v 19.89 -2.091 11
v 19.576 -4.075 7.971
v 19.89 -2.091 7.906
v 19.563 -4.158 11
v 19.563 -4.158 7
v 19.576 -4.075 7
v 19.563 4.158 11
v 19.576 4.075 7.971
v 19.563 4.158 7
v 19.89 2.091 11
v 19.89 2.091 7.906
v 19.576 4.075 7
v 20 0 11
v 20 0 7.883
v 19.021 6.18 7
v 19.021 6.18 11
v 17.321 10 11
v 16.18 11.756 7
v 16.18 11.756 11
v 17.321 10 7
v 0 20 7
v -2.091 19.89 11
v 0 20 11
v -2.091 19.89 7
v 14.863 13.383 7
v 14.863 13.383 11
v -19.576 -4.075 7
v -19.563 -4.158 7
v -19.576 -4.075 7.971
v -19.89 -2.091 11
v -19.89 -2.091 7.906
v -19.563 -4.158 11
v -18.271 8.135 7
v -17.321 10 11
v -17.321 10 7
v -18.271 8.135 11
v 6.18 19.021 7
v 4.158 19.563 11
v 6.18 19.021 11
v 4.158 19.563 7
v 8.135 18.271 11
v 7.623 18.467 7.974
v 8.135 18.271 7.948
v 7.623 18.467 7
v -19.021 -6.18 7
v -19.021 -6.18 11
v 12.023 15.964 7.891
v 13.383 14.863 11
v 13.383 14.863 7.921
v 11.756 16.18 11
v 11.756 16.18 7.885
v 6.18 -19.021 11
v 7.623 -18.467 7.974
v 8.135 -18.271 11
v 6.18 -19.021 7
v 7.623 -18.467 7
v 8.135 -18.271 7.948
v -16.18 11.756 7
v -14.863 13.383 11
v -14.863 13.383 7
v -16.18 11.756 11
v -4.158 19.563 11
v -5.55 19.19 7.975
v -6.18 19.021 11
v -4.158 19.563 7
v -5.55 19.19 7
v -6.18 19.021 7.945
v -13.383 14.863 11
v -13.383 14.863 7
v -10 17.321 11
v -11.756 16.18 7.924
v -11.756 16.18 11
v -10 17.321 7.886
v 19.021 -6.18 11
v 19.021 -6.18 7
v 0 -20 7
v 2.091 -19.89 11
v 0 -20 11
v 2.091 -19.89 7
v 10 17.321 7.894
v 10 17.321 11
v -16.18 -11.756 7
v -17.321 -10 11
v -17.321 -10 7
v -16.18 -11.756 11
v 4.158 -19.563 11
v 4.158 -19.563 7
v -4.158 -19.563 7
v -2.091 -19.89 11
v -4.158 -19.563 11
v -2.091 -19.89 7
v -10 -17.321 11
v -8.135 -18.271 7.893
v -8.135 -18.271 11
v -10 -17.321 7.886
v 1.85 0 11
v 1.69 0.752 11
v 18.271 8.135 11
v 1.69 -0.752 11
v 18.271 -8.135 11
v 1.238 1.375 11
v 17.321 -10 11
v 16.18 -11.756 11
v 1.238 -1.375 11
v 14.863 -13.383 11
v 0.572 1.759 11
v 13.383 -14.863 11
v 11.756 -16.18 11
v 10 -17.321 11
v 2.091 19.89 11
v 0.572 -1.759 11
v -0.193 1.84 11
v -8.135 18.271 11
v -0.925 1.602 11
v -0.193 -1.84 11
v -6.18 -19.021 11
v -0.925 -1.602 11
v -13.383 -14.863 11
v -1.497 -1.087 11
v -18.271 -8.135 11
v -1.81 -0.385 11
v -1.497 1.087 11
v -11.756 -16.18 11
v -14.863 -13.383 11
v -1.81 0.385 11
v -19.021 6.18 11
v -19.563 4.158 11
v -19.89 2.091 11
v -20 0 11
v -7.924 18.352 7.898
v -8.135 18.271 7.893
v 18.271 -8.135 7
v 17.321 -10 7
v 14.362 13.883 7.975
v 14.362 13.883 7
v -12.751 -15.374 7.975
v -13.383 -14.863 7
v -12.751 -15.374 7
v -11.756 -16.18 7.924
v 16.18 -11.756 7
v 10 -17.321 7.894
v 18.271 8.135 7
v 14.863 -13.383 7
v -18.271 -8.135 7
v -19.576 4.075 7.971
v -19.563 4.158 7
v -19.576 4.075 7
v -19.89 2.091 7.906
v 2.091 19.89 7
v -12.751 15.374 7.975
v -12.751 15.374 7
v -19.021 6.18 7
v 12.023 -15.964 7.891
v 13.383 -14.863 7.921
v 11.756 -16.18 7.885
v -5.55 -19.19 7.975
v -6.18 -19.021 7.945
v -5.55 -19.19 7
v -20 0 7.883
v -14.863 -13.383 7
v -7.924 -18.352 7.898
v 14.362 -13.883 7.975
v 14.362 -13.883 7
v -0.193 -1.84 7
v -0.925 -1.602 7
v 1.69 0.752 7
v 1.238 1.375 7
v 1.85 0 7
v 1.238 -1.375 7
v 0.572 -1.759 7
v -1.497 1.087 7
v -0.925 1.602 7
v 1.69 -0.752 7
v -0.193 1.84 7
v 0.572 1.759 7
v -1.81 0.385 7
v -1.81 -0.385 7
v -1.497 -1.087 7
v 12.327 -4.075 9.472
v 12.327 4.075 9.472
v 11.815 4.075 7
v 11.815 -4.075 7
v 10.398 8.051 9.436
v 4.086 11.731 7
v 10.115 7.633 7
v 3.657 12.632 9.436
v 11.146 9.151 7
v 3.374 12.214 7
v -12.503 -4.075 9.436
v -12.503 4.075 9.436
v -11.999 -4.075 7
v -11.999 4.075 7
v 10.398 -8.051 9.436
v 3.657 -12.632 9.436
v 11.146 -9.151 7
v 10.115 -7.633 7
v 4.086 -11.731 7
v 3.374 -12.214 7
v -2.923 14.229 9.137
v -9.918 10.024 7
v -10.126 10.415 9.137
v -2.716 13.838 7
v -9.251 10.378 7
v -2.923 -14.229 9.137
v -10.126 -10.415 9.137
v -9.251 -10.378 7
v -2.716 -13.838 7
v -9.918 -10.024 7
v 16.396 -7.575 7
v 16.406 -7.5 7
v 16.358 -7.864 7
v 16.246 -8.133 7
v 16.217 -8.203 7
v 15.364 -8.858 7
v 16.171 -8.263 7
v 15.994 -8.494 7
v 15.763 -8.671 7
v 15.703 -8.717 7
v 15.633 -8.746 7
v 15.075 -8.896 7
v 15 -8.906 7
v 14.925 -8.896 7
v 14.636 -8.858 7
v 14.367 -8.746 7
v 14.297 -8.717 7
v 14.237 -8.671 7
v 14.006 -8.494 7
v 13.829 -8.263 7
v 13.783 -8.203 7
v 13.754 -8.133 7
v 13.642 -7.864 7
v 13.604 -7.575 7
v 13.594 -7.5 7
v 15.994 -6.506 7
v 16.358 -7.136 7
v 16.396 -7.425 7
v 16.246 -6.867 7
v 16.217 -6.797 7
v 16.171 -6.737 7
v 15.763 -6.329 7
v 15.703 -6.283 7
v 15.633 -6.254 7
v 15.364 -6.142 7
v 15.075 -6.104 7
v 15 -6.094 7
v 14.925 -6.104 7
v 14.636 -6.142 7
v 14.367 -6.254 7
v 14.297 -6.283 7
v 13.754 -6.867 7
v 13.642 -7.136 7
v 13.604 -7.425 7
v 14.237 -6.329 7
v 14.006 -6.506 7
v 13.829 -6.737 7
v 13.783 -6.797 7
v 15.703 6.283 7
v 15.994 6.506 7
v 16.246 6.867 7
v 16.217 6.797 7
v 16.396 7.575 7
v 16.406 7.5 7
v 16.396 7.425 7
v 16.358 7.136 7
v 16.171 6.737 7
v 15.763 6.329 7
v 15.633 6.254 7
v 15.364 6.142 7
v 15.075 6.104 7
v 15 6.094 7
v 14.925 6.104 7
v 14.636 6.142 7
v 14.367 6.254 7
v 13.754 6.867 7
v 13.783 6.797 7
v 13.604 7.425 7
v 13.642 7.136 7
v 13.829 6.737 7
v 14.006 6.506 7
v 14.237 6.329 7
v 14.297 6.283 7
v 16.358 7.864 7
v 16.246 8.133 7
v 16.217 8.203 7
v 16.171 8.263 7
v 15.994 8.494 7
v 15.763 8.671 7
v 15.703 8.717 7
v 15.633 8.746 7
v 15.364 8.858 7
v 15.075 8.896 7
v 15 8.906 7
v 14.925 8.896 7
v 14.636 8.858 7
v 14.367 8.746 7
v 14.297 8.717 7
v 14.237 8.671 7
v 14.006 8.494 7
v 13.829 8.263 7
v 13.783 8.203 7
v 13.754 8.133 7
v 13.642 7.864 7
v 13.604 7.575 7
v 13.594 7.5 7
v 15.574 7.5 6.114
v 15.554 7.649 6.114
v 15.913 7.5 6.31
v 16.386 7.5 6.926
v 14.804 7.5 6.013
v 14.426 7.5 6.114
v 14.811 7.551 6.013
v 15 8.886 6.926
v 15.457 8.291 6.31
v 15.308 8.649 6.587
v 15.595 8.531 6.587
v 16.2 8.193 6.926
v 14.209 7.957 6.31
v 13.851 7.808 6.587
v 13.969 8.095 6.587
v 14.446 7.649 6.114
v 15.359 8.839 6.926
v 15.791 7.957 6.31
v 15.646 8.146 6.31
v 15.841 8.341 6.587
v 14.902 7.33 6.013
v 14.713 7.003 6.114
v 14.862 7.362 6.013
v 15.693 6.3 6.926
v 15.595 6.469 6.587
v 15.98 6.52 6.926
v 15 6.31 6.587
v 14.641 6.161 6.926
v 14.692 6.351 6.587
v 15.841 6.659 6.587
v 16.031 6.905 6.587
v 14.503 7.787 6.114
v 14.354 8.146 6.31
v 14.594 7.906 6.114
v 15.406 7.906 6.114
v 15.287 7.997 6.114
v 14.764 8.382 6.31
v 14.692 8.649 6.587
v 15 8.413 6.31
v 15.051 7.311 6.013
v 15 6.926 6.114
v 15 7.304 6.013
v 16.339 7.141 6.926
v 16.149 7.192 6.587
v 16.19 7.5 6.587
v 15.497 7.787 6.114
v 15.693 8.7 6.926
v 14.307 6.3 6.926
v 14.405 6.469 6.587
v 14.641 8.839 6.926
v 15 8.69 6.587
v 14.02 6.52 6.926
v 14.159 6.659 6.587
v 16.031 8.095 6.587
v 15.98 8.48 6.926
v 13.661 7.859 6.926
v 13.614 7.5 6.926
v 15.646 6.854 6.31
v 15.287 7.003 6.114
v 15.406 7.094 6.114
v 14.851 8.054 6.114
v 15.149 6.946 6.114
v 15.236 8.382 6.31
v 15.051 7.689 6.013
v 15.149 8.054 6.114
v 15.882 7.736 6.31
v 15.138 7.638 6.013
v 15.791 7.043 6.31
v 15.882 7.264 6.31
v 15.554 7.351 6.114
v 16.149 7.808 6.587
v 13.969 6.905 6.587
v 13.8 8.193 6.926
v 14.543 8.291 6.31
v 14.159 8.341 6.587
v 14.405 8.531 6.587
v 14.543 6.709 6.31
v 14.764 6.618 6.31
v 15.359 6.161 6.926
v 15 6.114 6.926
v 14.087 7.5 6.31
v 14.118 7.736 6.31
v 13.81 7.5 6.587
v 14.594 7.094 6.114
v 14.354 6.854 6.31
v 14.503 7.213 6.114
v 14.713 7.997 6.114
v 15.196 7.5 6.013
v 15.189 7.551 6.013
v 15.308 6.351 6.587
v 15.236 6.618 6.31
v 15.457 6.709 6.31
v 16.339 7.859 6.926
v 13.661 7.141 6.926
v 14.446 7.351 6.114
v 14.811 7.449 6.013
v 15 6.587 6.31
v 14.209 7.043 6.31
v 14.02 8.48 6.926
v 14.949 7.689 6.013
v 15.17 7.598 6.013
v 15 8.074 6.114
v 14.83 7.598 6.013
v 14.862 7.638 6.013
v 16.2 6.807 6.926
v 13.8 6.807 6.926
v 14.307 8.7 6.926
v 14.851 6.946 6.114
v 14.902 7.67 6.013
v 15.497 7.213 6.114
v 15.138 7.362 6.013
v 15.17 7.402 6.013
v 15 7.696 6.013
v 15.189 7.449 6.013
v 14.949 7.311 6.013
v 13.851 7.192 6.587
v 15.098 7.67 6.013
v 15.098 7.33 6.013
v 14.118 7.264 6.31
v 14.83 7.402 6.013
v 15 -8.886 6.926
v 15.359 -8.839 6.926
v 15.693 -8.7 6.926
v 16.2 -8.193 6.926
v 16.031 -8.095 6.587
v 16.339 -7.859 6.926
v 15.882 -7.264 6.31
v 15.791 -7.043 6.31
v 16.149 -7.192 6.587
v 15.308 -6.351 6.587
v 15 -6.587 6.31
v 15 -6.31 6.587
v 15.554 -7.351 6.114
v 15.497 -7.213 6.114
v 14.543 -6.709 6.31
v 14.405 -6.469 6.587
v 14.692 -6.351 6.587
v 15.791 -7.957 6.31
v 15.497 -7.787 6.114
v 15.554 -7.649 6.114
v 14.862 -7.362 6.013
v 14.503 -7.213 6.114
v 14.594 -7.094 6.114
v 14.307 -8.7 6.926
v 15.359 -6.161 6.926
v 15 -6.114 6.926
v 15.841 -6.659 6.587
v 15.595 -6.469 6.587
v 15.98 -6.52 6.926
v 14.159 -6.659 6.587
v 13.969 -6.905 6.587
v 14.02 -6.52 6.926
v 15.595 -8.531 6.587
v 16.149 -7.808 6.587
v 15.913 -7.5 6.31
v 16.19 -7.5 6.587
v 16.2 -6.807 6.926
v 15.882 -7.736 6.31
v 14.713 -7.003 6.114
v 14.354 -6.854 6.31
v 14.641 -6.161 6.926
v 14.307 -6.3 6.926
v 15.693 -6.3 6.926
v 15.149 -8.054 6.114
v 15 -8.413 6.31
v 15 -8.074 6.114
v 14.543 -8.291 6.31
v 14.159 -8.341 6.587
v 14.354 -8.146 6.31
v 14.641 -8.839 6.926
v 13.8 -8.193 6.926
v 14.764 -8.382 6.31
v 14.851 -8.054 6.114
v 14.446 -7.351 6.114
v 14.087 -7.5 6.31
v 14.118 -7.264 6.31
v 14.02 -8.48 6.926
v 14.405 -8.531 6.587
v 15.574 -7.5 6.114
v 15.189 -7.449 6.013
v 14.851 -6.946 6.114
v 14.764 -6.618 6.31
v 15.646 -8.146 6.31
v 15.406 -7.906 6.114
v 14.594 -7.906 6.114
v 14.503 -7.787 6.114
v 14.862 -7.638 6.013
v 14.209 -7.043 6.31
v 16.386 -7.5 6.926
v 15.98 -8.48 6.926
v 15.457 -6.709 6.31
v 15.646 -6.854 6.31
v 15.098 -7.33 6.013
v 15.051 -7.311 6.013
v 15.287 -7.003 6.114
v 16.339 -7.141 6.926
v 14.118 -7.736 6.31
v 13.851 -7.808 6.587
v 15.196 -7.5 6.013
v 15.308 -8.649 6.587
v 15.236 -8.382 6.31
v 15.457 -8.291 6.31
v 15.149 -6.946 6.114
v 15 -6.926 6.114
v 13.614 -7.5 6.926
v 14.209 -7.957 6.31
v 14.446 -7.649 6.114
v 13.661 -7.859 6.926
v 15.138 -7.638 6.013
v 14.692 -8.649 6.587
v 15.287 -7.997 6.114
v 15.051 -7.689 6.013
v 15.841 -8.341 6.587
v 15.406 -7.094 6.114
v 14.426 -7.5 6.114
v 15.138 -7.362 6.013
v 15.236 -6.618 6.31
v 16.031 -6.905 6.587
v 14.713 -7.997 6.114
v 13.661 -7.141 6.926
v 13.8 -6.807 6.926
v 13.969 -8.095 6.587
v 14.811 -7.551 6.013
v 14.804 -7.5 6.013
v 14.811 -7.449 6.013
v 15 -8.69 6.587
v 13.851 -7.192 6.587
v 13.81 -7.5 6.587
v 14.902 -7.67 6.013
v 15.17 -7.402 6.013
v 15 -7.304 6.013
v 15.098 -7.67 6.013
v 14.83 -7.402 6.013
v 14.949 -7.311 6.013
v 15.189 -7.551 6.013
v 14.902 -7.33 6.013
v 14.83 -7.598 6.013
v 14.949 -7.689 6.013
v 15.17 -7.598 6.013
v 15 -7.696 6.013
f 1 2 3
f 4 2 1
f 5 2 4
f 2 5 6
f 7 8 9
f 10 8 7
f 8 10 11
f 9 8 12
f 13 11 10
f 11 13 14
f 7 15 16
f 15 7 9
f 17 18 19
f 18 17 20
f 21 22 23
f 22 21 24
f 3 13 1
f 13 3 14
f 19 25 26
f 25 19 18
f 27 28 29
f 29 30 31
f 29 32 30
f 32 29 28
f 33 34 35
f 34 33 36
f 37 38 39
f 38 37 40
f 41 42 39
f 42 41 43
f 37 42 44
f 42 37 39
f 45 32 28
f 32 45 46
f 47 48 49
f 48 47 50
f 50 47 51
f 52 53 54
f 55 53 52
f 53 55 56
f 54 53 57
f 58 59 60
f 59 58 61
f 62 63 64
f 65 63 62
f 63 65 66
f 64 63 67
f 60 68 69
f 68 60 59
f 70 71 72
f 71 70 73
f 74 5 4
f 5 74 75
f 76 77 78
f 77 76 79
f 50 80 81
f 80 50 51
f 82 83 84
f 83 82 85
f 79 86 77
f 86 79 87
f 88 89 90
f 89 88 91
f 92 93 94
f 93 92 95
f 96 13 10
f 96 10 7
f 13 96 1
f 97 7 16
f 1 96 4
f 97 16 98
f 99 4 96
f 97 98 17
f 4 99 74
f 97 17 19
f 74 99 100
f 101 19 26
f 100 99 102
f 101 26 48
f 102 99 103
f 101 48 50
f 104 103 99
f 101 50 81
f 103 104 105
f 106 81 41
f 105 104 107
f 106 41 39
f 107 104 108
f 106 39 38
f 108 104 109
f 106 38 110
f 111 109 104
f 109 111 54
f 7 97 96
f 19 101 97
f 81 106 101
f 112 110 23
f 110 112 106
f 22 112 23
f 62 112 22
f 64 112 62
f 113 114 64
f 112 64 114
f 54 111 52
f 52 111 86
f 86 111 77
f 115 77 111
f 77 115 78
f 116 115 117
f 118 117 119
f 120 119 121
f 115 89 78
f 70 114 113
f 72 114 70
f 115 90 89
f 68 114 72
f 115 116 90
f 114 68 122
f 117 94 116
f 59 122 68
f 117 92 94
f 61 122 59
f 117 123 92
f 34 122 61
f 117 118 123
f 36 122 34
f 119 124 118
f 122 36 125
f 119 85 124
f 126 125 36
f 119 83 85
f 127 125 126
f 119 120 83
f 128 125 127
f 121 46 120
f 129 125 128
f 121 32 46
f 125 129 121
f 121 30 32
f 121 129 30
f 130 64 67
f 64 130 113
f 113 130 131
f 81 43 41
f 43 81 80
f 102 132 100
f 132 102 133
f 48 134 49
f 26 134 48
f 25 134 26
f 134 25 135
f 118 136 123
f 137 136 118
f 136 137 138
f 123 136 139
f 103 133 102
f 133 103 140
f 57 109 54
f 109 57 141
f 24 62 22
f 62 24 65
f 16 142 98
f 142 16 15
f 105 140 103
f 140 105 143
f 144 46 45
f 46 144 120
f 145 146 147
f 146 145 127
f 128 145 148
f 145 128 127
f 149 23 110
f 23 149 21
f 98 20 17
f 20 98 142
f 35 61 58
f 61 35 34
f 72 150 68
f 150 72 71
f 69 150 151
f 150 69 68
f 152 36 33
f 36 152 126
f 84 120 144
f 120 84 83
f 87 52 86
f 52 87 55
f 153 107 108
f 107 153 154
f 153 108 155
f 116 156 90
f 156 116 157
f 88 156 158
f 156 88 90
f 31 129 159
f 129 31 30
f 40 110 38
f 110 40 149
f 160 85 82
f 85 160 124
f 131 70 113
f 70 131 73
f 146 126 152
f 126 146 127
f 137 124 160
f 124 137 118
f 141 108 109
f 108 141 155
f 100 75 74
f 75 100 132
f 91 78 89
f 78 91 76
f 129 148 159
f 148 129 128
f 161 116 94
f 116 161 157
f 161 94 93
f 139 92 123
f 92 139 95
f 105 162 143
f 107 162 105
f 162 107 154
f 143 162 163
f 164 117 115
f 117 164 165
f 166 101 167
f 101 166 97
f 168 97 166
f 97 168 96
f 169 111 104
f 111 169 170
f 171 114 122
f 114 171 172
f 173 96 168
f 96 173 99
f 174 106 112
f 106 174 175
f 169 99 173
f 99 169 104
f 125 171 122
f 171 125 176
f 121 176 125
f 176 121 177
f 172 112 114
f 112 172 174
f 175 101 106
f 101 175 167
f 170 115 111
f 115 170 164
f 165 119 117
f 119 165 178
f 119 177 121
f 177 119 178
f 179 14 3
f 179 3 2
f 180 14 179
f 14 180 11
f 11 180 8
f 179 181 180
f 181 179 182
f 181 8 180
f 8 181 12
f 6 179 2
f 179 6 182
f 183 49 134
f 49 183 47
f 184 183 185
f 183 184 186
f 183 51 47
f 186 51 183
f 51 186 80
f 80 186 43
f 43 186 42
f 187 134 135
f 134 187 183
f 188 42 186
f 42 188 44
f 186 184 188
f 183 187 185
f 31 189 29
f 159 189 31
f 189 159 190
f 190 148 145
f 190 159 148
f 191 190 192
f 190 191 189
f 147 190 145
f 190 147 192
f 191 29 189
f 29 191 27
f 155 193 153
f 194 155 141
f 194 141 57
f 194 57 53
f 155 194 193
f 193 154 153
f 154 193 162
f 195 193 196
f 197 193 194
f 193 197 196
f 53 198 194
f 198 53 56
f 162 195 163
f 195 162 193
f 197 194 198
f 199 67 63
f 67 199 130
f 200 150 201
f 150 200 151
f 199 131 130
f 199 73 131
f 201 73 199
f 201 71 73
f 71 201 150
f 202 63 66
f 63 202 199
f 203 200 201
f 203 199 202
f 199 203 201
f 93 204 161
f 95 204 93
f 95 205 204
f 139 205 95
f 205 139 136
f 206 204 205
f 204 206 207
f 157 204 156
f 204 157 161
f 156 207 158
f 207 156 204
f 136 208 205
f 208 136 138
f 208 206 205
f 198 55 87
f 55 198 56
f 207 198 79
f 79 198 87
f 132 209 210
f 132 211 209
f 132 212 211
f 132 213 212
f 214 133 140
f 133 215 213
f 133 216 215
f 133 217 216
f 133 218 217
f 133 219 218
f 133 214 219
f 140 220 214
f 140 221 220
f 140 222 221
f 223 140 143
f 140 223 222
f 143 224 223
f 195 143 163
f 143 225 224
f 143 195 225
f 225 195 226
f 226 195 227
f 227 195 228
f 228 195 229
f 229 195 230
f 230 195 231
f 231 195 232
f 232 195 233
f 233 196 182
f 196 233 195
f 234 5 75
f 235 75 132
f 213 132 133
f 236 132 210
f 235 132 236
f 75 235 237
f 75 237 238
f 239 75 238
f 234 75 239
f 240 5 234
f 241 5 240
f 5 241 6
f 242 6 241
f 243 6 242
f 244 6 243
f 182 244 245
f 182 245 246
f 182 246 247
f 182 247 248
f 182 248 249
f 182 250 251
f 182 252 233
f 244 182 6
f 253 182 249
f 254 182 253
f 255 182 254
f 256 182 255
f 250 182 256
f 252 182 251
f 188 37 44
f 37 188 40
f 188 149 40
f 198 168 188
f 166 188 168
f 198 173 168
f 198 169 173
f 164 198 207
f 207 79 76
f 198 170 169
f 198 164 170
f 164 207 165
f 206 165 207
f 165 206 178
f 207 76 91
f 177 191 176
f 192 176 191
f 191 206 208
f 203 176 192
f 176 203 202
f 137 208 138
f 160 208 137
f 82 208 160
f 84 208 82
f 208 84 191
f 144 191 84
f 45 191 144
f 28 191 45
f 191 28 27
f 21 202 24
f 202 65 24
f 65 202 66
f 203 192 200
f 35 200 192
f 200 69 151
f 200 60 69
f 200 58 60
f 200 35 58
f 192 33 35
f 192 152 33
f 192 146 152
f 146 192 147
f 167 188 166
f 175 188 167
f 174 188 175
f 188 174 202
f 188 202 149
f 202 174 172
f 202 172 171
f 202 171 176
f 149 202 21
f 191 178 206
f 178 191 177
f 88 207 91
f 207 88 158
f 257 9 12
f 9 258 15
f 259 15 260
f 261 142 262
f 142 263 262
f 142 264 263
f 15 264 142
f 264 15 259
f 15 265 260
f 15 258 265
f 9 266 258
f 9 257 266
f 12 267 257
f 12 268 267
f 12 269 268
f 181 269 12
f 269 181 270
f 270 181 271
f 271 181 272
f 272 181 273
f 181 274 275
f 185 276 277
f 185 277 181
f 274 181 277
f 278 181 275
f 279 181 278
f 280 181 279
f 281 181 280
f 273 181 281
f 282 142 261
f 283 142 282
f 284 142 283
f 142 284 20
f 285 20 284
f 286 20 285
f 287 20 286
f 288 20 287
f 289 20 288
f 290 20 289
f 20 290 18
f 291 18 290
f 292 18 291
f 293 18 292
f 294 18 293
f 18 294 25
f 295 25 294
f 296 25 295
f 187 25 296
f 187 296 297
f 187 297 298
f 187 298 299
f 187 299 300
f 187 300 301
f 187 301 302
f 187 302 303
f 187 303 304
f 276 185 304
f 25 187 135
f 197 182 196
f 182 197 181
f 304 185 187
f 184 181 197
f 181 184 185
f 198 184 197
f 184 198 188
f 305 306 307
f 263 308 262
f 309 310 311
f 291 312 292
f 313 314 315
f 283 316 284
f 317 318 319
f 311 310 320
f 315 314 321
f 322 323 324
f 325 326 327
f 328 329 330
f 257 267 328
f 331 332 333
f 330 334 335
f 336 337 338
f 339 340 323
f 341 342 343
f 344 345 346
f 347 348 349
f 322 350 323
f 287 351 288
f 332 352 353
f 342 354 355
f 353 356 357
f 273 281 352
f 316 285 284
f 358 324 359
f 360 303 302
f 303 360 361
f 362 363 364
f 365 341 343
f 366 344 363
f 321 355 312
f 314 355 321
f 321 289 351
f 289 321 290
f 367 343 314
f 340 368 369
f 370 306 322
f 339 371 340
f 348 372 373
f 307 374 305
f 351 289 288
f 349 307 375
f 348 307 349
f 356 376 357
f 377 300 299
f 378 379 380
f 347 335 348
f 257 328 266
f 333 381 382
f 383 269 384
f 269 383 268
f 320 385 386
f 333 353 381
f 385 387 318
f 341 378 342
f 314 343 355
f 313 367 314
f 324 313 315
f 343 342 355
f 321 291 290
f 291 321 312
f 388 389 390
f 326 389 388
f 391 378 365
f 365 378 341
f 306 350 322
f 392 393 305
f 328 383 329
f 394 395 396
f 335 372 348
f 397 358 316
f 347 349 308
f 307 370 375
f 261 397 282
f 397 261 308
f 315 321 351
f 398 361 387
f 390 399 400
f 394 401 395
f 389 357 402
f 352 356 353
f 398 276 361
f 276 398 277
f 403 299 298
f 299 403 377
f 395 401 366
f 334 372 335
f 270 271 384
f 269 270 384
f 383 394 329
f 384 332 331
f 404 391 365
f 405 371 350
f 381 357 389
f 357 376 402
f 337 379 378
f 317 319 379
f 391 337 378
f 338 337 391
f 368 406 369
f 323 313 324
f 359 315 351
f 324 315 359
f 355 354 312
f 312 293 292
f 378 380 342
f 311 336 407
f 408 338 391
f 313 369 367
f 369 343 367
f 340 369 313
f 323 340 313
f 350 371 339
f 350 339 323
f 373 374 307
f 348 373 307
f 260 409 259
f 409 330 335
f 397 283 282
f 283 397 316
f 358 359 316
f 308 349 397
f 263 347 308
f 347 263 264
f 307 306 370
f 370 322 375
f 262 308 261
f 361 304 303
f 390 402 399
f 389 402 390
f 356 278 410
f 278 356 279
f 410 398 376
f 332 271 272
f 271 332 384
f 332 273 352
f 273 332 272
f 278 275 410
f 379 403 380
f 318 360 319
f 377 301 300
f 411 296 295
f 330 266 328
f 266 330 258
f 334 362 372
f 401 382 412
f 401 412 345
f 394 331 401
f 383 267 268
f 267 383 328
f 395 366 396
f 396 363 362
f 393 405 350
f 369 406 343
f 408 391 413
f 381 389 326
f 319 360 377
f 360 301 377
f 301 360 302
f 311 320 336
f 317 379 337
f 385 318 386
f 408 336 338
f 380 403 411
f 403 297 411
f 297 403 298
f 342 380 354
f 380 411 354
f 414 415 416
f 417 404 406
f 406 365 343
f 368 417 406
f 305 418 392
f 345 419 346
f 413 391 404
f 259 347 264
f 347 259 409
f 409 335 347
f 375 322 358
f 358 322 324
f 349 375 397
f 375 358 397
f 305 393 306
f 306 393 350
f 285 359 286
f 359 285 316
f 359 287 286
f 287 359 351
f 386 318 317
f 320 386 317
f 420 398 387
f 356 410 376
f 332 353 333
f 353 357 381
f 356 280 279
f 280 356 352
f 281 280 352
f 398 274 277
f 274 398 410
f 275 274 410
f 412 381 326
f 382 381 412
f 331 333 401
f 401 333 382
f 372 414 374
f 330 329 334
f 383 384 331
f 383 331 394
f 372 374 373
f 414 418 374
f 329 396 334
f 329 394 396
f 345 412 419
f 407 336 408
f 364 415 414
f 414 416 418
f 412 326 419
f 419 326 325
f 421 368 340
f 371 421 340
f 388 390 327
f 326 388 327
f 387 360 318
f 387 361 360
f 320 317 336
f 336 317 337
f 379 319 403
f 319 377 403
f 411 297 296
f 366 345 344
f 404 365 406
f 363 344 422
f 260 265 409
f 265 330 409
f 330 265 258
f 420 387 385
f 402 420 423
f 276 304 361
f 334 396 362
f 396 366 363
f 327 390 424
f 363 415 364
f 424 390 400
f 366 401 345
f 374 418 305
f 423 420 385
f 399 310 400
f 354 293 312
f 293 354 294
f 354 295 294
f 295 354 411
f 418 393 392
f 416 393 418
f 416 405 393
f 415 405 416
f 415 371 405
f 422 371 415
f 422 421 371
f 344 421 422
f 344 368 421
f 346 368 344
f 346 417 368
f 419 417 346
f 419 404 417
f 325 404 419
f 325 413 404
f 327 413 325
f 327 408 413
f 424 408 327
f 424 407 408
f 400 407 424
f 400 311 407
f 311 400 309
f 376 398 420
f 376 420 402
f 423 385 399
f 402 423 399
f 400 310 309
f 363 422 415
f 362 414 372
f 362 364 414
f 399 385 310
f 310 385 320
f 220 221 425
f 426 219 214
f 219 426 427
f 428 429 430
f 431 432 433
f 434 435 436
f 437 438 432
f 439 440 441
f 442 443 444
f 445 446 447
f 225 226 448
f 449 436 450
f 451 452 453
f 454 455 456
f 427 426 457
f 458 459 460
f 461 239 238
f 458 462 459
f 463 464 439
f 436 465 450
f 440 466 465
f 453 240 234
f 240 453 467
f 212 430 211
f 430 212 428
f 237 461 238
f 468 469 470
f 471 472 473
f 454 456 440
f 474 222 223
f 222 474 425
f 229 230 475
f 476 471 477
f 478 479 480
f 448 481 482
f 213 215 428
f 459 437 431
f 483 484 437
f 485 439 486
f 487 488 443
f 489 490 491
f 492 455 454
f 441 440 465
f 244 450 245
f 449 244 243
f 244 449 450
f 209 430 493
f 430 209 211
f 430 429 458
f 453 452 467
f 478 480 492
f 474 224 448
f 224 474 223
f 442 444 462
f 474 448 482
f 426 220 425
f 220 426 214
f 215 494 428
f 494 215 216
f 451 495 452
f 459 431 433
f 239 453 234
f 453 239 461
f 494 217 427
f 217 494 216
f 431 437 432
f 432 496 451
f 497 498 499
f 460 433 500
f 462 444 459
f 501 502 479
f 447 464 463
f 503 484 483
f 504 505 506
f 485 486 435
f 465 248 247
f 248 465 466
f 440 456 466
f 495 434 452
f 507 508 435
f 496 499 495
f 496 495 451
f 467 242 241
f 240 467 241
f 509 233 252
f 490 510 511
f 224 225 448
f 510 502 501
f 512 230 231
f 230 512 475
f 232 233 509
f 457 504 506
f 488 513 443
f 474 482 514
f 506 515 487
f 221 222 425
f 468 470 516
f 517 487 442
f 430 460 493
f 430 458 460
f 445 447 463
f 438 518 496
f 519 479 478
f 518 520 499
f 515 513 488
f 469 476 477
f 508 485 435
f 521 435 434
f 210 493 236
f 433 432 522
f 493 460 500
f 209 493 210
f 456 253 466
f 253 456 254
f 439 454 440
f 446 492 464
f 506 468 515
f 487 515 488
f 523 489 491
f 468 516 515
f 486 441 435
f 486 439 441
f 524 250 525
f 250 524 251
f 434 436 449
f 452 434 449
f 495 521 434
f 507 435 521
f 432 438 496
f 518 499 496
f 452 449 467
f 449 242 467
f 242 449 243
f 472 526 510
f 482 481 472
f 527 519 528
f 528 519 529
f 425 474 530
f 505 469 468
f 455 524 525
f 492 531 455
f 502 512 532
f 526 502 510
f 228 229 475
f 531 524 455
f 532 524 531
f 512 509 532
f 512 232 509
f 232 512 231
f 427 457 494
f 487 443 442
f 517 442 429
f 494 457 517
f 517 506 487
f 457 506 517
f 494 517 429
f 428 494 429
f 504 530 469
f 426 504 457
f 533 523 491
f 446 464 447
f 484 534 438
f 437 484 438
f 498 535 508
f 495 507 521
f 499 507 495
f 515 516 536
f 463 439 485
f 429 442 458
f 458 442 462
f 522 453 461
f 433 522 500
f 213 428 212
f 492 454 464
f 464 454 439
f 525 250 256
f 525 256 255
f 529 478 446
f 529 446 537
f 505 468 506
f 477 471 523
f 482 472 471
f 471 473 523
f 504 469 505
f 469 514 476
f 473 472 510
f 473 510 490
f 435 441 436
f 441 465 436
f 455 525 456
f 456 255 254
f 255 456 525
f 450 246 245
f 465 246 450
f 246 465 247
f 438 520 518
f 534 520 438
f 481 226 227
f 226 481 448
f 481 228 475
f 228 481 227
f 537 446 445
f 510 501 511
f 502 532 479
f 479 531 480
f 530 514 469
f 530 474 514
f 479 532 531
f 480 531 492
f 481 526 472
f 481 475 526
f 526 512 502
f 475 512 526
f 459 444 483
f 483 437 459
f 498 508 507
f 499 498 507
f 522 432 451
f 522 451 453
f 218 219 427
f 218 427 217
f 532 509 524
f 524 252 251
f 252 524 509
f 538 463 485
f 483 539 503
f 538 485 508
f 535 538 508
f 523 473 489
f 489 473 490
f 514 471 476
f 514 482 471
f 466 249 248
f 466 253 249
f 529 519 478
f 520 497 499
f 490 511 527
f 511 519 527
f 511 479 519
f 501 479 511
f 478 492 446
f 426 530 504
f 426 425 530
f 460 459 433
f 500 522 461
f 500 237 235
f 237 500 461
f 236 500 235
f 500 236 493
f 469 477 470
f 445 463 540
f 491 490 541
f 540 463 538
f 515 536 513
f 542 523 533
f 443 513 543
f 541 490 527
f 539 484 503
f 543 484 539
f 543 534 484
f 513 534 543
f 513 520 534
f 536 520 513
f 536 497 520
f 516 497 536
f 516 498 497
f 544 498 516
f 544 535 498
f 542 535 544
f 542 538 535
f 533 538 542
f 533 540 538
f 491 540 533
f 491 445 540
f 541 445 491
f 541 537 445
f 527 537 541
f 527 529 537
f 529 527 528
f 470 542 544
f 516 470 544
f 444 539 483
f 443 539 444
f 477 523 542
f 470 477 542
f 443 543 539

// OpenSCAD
offset=-3;

//difference(){
//translate([0,0,offset])
//cylinder(d=40,h=30,$fn=60,center=true);
//cylinder(d=3.7,h=60,$fn=15,center=true);
//rotate([0,0,0])//A
//rotate([0,11.7,0])translate([20.1,0,0])
//cube([20,8.15,23.55],center=true);
//rotate([0,0,55.8])//B
//rotate([0,11.7,0])translate([20.28,0,0])
//cube([20,8.15,23.55],center=true);
//rotate([0,0,180])//B
//rotate([0,11.7,0])translate([20.33,0,0])
//cube([20,8.15,23.55],center=true);
//rotate([0,0,-55.8])//B
//rotate([0,11.7,0])translate([20.33,0,0])
//cube([20,8.15,23.55],center=true);
//rotate([0,0,55.8+62.1])//C
//rotate([0,11.7,0])translate([21.80,0,0])
//cube([20,8.15,23.55],center=true);
//rotate([0,0,-55.8-62.1])//C
//rotate([0,11.7,0])translate([21.80,0,0])
//cube([20,8.15,23.55],center=true);
//translate([0,0,-12])cylinder(d=50,h=30);
//}
//difference(){
//translate([0,0,-18])cylinder(d=10,h=12,$fn=30);
//cylinder(d=3,h=100,$fn=12,center=true);
//}
//translate([15,7.5,-12.3])sphere(r=1.5,$fn=24);
//translate([15,-7.5,-12.3])sphere(r=1.5,$fn=24);

difference(){
translate([0,0,offset])
cylinder(d=40,h=28,$fn=60,center=true);
cylinder(d=3.7,h=60,$fn=15,center=true);
rotate([0,0,0])//A
rotate([0,11.7,0])translate([20.15,0,0])
cube([20,8.15,23.55],center=true);
rotate([0,0,55.8])//B
rotate([0,11.7,0])translate([20.33,0,0])
cube([20,8.15,23.55],center=true);
rotate([0,0,180])//B
rotate([0,11.7,0])translate([20.33,0,0])
cube([20,8.15,23.55],center=true);
rotate([0,0,-55.8])//B
rotate([0,11.7,0])translate([20.33,0,0])
cube([20,8.15,23.55],center=true);
rotate([0,0,55.8+62.1])//C
rotate([0,11.7,0])translate([21.80,0,0])
cube([20,8.15,23.55],center=true);
rotate([0,0,-55.8-62.1])//C
rotate([0,11.7,0])translate([21.80,0,0])
cube([20,8.15,23.55],center=true);
translate([0,0,-23])cylinder(d=50,h=30);
}
translate([15,7.5,7.5])sphere(r=1.5,$fn=24);
translate([15,-7.5,7.5])sphere(r=1.5,$fn=24);

%rotate([0,0,0])
rotate([0,11.7,0])translate([20.15,0,0])
cube([20,8.15,23.55],center=true);
